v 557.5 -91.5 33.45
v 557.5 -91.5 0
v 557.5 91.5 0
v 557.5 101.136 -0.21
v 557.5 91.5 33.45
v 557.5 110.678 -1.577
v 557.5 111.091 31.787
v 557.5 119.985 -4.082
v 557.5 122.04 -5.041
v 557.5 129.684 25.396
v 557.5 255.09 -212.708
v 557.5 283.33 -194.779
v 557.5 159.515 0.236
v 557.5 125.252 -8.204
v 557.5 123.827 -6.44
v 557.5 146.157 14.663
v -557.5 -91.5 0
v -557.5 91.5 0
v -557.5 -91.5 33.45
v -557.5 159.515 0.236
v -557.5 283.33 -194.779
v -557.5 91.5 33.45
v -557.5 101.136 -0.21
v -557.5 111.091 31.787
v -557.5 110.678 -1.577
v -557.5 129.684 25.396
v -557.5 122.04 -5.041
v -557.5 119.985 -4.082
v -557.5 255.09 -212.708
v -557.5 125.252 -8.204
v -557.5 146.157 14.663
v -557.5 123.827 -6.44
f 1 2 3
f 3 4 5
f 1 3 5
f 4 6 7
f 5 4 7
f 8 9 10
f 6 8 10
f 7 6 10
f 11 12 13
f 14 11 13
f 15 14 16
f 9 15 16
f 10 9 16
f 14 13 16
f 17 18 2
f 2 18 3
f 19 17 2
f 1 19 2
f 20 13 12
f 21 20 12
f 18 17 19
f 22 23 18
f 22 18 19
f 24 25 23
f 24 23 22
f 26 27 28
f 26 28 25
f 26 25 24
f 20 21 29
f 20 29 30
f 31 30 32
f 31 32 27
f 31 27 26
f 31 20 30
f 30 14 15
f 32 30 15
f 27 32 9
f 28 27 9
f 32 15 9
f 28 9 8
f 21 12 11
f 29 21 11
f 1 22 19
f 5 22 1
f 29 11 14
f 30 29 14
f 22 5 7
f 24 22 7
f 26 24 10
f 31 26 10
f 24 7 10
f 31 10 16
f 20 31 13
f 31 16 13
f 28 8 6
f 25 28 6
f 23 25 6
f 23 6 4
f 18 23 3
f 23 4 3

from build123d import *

# Parameters (mm, degrees)
SKETCH1_W           = 1115
SKETCH1_H           = 183
BOSS_EXTRUDE1_DEPTH = 33.45
BOSS_EXTRUDE2_DEPTH = 1115


with BuildPart() as part:
    # Sketch1 → Boss-Extrude1 (new body)
    with BuildSketch(Plane.XY):
        Rectangle(SKETCH1_W, SKETCH1_H)
    extrude(amount=BOSS_EXTRUDE1_DEPTH)

    # Sketch2 → Boss-Extrude2 (add)
    with BuildSketch(Plane(origin=(557.5, 0, 0), x_dir=(0, 0, -1), z_dir=(1, 0, 0))):
        with BuildLine():
            Line((-0.236252667, 159.515154012), (194.779142231, 283.329514055))
            Line((194.779142231, 283.329514055), (212.708104756, 255.090271807))
            Line((212.708104756, 255.090271807), (8.204240057, 125.251726766))
            ThreePointArc((8.204240057, 125.251726766), (5.689681252, 122.973302793), (4.081808438, 119.985165113))
            ThreePointArc((4.081808438, 119.985165113), (0.749606072, 105.927620335), (0, 91.5))
            Line((0, 91.5), (-33.45, 91.5))
            ThreePointArc((-33.45, 91.5), (-25.395939678, 129.684160674), (-0.236252667, 159.515154012))
        make_face()
    extrude(amount=-BOSS_EXTRUDE2_DEPTH)


solid = part.part
